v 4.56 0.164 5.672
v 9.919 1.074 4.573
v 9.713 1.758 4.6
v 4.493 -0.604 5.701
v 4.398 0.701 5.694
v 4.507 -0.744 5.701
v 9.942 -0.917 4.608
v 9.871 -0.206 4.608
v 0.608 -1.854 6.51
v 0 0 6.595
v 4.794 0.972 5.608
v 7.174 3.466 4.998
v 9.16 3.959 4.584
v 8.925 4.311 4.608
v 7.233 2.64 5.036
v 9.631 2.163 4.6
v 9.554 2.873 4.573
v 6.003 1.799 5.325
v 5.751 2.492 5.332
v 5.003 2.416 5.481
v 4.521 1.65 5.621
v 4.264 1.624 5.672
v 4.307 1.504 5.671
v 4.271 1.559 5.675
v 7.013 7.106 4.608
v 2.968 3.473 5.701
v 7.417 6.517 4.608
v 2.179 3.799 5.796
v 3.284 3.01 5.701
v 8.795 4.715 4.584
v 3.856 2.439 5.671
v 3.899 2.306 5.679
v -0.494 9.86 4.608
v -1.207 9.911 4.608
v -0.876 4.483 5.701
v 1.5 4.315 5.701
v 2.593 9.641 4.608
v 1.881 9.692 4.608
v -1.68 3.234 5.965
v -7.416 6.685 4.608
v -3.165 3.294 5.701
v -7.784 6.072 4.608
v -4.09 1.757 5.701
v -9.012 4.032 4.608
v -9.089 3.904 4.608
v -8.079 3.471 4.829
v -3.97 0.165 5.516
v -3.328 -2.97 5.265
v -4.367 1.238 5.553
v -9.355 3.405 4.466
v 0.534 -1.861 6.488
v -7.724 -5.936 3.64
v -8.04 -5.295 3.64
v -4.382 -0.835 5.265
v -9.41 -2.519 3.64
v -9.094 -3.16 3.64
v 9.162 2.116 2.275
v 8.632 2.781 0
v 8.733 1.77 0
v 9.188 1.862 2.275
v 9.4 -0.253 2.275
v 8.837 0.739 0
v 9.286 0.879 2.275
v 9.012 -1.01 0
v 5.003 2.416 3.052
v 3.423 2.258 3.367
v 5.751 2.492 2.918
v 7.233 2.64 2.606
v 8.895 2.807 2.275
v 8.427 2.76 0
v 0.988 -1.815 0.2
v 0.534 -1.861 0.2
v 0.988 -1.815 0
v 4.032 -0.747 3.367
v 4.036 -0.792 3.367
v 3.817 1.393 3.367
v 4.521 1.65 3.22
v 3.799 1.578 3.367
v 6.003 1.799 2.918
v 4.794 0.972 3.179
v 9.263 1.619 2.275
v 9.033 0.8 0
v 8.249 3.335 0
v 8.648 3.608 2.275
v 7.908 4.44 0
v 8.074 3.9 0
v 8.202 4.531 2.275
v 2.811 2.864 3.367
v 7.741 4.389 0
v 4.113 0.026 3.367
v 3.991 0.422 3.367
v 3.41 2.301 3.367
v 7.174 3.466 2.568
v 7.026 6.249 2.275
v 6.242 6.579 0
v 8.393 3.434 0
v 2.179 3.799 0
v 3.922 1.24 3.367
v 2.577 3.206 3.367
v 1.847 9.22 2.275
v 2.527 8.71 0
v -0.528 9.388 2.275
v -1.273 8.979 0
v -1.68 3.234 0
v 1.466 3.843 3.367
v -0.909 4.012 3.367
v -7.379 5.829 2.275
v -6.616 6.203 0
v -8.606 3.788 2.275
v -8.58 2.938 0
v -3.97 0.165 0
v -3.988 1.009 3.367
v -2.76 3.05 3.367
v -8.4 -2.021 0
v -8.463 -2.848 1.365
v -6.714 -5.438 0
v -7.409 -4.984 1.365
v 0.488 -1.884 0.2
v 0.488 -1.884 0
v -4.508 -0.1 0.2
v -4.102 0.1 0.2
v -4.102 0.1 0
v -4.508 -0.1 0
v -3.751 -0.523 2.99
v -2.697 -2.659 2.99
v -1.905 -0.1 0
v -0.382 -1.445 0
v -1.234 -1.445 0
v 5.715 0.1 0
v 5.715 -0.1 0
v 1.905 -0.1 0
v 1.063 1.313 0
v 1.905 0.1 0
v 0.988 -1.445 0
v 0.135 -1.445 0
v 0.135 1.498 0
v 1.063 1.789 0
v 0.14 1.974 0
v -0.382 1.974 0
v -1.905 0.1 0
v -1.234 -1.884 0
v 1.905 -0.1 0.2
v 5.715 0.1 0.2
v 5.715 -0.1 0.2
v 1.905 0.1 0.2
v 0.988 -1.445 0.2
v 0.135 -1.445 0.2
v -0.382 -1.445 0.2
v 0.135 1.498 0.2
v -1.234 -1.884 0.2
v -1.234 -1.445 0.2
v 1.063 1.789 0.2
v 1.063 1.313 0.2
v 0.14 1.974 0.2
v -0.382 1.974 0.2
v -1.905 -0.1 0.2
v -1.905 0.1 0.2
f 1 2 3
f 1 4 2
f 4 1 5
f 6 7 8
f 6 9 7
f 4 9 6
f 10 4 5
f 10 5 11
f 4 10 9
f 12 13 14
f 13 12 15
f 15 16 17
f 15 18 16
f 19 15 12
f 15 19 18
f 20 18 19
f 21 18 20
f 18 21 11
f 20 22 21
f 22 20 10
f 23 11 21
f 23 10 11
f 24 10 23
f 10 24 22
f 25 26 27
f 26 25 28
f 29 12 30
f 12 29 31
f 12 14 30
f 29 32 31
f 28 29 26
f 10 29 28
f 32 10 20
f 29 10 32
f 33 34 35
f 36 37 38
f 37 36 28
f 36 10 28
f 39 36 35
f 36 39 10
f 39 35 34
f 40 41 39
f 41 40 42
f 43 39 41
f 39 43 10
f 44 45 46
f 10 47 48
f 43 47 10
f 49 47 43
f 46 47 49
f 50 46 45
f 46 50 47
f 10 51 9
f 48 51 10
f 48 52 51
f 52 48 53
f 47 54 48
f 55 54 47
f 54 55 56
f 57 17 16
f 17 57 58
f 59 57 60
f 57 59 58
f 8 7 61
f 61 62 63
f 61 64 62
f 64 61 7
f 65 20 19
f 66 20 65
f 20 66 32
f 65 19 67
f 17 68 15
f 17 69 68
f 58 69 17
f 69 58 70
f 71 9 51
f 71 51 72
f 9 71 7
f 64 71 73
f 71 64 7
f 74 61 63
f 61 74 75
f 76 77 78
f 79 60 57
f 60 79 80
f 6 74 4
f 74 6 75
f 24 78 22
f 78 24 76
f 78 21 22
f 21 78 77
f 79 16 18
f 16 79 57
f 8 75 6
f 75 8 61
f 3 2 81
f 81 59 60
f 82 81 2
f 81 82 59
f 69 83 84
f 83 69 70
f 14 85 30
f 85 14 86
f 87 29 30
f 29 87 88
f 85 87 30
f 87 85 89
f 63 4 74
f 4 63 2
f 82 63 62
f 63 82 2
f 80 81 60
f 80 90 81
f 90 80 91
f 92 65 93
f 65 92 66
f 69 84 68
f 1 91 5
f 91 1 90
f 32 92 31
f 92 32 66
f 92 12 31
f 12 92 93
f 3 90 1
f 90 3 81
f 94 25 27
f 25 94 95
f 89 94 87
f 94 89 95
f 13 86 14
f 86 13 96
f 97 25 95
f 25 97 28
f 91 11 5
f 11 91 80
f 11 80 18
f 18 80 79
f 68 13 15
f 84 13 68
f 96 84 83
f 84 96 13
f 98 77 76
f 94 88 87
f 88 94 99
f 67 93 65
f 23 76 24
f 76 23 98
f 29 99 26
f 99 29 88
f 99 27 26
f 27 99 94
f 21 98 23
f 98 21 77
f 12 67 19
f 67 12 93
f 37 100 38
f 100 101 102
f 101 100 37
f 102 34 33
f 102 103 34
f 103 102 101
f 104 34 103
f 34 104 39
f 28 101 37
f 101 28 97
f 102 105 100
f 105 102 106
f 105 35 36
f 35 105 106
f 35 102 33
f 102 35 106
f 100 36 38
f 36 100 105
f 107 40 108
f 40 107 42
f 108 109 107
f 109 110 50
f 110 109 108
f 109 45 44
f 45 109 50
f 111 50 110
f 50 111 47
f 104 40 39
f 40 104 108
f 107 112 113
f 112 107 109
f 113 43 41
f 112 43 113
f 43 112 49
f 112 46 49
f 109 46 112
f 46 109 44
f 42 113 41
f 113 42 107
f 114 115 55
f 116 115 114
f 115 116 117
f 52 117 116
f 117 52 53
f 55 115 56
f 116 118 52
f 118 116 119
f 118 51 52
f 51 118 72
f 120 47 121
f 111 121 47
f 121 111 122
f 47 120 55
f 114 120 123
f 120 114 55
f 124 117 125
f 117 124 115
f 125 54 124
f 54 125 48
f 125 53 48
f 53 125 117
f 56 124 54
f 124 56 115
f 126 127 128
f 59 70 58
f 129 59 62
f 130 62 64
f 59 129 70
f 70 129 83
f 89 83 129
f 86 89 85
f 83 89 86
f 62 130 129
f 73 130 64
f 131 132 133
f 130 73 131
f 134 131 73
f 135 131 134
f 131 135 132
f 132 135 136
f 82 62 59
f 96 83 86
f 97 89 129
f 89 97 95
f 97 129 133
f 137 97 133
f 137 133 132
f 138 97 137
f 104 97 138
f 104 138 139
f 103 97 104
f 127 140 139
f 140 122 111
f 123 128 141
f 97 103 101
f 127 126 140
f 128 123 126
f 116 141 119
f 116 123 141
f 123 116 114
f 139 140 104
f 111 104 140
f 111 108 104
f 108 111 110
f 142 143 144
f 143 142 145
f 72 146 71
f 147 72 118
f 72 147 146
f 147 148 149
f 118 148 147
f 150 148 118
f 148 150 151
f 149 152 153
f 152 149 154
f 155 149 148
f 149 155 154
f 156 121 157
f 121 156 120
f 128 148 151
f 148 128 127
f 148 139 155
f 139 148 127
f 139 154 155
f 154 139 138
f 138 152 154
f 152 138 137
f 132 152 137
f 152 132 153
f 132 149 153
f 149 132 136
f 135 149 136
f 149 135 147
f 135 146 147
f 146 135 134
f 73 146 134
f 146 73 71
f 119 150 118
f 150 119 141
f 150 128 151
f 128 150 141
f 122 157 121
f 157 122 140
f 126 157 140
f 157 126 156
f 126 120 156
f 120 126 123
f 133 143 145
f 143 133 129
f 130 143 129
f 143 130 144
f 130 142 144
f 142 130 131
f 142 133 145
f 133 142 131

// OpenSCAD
aal = [ [-0.2, 0.1], [-0.2,0.3], [-0.2,0.6], [-0.2,1.5], [-0.2,2.6], [-0.3,3.6] ];

fill_depth = 1;
module end_params() { }

RAD=180.0/PI;
SECSZ=80;
member_w = 2.38125; // 3/32"
leg_w = 1.6*member_w;
leg_off = 4.5;
leg_len = 10;


module vertex_hull(aas) {
    intersection_for(aa = aas) {
        rotate(a=[0,-aa[0]*RAD,aa[1]*RAD])
        translate([0,0,-SECSZ/2])
        cube(size=[SECSZ,SECSZ,SECSZ],center=true);
    }
}

function depth_for_aa(aa) = leg_len * sin(-aa[0] * RAD) + leg_w * cos(-aa[0]*RAD);

module connector(aas) {
    d = max([for (x = aas) depth_for_aa(x) ]);
    translate([0,0,d])
    intersection() {
        translate([0,0,-0.00001]) vertex_hull(aas);
        for (aa = aas) {
            intersection() {
            rotate( a = [0, -aa[0]*RAD, aa[1]*RAD] )
                children();
            rotate( a = [0, 0, aa[1]*RAD] )
            translate([SECSZ/2,0,0])
            cube(size=[SECSZ,SECSZ,SECSZ],center=true);
        } }
        if (fill_depth) {
            translate([0,0,-d/2]) cube(size=[SECSZ,SECSZ,d],center=true);
        }
    }
}

module balsa_leg() {
    difference() {
        if (fill_depth == 1) {
            translate([0,-leg_w/2,-40]) cube(size=[leg_len,leg_w,40]); 
        } else {
            translate([0,-leg_w/2,-leg_w]) cube(size=[leg_len,leg_w,leg_w]); 
        }
        translate([leg_off,-member_w/2,-member_w]) cube(size=[leg_len,member_w,member_w+2]);
    }
}

module emboss_text(txt) {
    difference() { 
        children();
        rotate([0,180,0])
        translate([0,0,-0.2])
        linear_extrude(0.3) {
            text(txt, size=leg_w, font="Cabin", halign="center", valign="center");
            translate([leg_w,0,0]) square([leg_w,0.2],center=true);
            translate([-leg_w,0,0]) square([leg_w,0.2],center=true);
        }
    }
}
//connector( aal ) balsa_leg();
emboss_text("1") connector( aal ) balsa_leg();
